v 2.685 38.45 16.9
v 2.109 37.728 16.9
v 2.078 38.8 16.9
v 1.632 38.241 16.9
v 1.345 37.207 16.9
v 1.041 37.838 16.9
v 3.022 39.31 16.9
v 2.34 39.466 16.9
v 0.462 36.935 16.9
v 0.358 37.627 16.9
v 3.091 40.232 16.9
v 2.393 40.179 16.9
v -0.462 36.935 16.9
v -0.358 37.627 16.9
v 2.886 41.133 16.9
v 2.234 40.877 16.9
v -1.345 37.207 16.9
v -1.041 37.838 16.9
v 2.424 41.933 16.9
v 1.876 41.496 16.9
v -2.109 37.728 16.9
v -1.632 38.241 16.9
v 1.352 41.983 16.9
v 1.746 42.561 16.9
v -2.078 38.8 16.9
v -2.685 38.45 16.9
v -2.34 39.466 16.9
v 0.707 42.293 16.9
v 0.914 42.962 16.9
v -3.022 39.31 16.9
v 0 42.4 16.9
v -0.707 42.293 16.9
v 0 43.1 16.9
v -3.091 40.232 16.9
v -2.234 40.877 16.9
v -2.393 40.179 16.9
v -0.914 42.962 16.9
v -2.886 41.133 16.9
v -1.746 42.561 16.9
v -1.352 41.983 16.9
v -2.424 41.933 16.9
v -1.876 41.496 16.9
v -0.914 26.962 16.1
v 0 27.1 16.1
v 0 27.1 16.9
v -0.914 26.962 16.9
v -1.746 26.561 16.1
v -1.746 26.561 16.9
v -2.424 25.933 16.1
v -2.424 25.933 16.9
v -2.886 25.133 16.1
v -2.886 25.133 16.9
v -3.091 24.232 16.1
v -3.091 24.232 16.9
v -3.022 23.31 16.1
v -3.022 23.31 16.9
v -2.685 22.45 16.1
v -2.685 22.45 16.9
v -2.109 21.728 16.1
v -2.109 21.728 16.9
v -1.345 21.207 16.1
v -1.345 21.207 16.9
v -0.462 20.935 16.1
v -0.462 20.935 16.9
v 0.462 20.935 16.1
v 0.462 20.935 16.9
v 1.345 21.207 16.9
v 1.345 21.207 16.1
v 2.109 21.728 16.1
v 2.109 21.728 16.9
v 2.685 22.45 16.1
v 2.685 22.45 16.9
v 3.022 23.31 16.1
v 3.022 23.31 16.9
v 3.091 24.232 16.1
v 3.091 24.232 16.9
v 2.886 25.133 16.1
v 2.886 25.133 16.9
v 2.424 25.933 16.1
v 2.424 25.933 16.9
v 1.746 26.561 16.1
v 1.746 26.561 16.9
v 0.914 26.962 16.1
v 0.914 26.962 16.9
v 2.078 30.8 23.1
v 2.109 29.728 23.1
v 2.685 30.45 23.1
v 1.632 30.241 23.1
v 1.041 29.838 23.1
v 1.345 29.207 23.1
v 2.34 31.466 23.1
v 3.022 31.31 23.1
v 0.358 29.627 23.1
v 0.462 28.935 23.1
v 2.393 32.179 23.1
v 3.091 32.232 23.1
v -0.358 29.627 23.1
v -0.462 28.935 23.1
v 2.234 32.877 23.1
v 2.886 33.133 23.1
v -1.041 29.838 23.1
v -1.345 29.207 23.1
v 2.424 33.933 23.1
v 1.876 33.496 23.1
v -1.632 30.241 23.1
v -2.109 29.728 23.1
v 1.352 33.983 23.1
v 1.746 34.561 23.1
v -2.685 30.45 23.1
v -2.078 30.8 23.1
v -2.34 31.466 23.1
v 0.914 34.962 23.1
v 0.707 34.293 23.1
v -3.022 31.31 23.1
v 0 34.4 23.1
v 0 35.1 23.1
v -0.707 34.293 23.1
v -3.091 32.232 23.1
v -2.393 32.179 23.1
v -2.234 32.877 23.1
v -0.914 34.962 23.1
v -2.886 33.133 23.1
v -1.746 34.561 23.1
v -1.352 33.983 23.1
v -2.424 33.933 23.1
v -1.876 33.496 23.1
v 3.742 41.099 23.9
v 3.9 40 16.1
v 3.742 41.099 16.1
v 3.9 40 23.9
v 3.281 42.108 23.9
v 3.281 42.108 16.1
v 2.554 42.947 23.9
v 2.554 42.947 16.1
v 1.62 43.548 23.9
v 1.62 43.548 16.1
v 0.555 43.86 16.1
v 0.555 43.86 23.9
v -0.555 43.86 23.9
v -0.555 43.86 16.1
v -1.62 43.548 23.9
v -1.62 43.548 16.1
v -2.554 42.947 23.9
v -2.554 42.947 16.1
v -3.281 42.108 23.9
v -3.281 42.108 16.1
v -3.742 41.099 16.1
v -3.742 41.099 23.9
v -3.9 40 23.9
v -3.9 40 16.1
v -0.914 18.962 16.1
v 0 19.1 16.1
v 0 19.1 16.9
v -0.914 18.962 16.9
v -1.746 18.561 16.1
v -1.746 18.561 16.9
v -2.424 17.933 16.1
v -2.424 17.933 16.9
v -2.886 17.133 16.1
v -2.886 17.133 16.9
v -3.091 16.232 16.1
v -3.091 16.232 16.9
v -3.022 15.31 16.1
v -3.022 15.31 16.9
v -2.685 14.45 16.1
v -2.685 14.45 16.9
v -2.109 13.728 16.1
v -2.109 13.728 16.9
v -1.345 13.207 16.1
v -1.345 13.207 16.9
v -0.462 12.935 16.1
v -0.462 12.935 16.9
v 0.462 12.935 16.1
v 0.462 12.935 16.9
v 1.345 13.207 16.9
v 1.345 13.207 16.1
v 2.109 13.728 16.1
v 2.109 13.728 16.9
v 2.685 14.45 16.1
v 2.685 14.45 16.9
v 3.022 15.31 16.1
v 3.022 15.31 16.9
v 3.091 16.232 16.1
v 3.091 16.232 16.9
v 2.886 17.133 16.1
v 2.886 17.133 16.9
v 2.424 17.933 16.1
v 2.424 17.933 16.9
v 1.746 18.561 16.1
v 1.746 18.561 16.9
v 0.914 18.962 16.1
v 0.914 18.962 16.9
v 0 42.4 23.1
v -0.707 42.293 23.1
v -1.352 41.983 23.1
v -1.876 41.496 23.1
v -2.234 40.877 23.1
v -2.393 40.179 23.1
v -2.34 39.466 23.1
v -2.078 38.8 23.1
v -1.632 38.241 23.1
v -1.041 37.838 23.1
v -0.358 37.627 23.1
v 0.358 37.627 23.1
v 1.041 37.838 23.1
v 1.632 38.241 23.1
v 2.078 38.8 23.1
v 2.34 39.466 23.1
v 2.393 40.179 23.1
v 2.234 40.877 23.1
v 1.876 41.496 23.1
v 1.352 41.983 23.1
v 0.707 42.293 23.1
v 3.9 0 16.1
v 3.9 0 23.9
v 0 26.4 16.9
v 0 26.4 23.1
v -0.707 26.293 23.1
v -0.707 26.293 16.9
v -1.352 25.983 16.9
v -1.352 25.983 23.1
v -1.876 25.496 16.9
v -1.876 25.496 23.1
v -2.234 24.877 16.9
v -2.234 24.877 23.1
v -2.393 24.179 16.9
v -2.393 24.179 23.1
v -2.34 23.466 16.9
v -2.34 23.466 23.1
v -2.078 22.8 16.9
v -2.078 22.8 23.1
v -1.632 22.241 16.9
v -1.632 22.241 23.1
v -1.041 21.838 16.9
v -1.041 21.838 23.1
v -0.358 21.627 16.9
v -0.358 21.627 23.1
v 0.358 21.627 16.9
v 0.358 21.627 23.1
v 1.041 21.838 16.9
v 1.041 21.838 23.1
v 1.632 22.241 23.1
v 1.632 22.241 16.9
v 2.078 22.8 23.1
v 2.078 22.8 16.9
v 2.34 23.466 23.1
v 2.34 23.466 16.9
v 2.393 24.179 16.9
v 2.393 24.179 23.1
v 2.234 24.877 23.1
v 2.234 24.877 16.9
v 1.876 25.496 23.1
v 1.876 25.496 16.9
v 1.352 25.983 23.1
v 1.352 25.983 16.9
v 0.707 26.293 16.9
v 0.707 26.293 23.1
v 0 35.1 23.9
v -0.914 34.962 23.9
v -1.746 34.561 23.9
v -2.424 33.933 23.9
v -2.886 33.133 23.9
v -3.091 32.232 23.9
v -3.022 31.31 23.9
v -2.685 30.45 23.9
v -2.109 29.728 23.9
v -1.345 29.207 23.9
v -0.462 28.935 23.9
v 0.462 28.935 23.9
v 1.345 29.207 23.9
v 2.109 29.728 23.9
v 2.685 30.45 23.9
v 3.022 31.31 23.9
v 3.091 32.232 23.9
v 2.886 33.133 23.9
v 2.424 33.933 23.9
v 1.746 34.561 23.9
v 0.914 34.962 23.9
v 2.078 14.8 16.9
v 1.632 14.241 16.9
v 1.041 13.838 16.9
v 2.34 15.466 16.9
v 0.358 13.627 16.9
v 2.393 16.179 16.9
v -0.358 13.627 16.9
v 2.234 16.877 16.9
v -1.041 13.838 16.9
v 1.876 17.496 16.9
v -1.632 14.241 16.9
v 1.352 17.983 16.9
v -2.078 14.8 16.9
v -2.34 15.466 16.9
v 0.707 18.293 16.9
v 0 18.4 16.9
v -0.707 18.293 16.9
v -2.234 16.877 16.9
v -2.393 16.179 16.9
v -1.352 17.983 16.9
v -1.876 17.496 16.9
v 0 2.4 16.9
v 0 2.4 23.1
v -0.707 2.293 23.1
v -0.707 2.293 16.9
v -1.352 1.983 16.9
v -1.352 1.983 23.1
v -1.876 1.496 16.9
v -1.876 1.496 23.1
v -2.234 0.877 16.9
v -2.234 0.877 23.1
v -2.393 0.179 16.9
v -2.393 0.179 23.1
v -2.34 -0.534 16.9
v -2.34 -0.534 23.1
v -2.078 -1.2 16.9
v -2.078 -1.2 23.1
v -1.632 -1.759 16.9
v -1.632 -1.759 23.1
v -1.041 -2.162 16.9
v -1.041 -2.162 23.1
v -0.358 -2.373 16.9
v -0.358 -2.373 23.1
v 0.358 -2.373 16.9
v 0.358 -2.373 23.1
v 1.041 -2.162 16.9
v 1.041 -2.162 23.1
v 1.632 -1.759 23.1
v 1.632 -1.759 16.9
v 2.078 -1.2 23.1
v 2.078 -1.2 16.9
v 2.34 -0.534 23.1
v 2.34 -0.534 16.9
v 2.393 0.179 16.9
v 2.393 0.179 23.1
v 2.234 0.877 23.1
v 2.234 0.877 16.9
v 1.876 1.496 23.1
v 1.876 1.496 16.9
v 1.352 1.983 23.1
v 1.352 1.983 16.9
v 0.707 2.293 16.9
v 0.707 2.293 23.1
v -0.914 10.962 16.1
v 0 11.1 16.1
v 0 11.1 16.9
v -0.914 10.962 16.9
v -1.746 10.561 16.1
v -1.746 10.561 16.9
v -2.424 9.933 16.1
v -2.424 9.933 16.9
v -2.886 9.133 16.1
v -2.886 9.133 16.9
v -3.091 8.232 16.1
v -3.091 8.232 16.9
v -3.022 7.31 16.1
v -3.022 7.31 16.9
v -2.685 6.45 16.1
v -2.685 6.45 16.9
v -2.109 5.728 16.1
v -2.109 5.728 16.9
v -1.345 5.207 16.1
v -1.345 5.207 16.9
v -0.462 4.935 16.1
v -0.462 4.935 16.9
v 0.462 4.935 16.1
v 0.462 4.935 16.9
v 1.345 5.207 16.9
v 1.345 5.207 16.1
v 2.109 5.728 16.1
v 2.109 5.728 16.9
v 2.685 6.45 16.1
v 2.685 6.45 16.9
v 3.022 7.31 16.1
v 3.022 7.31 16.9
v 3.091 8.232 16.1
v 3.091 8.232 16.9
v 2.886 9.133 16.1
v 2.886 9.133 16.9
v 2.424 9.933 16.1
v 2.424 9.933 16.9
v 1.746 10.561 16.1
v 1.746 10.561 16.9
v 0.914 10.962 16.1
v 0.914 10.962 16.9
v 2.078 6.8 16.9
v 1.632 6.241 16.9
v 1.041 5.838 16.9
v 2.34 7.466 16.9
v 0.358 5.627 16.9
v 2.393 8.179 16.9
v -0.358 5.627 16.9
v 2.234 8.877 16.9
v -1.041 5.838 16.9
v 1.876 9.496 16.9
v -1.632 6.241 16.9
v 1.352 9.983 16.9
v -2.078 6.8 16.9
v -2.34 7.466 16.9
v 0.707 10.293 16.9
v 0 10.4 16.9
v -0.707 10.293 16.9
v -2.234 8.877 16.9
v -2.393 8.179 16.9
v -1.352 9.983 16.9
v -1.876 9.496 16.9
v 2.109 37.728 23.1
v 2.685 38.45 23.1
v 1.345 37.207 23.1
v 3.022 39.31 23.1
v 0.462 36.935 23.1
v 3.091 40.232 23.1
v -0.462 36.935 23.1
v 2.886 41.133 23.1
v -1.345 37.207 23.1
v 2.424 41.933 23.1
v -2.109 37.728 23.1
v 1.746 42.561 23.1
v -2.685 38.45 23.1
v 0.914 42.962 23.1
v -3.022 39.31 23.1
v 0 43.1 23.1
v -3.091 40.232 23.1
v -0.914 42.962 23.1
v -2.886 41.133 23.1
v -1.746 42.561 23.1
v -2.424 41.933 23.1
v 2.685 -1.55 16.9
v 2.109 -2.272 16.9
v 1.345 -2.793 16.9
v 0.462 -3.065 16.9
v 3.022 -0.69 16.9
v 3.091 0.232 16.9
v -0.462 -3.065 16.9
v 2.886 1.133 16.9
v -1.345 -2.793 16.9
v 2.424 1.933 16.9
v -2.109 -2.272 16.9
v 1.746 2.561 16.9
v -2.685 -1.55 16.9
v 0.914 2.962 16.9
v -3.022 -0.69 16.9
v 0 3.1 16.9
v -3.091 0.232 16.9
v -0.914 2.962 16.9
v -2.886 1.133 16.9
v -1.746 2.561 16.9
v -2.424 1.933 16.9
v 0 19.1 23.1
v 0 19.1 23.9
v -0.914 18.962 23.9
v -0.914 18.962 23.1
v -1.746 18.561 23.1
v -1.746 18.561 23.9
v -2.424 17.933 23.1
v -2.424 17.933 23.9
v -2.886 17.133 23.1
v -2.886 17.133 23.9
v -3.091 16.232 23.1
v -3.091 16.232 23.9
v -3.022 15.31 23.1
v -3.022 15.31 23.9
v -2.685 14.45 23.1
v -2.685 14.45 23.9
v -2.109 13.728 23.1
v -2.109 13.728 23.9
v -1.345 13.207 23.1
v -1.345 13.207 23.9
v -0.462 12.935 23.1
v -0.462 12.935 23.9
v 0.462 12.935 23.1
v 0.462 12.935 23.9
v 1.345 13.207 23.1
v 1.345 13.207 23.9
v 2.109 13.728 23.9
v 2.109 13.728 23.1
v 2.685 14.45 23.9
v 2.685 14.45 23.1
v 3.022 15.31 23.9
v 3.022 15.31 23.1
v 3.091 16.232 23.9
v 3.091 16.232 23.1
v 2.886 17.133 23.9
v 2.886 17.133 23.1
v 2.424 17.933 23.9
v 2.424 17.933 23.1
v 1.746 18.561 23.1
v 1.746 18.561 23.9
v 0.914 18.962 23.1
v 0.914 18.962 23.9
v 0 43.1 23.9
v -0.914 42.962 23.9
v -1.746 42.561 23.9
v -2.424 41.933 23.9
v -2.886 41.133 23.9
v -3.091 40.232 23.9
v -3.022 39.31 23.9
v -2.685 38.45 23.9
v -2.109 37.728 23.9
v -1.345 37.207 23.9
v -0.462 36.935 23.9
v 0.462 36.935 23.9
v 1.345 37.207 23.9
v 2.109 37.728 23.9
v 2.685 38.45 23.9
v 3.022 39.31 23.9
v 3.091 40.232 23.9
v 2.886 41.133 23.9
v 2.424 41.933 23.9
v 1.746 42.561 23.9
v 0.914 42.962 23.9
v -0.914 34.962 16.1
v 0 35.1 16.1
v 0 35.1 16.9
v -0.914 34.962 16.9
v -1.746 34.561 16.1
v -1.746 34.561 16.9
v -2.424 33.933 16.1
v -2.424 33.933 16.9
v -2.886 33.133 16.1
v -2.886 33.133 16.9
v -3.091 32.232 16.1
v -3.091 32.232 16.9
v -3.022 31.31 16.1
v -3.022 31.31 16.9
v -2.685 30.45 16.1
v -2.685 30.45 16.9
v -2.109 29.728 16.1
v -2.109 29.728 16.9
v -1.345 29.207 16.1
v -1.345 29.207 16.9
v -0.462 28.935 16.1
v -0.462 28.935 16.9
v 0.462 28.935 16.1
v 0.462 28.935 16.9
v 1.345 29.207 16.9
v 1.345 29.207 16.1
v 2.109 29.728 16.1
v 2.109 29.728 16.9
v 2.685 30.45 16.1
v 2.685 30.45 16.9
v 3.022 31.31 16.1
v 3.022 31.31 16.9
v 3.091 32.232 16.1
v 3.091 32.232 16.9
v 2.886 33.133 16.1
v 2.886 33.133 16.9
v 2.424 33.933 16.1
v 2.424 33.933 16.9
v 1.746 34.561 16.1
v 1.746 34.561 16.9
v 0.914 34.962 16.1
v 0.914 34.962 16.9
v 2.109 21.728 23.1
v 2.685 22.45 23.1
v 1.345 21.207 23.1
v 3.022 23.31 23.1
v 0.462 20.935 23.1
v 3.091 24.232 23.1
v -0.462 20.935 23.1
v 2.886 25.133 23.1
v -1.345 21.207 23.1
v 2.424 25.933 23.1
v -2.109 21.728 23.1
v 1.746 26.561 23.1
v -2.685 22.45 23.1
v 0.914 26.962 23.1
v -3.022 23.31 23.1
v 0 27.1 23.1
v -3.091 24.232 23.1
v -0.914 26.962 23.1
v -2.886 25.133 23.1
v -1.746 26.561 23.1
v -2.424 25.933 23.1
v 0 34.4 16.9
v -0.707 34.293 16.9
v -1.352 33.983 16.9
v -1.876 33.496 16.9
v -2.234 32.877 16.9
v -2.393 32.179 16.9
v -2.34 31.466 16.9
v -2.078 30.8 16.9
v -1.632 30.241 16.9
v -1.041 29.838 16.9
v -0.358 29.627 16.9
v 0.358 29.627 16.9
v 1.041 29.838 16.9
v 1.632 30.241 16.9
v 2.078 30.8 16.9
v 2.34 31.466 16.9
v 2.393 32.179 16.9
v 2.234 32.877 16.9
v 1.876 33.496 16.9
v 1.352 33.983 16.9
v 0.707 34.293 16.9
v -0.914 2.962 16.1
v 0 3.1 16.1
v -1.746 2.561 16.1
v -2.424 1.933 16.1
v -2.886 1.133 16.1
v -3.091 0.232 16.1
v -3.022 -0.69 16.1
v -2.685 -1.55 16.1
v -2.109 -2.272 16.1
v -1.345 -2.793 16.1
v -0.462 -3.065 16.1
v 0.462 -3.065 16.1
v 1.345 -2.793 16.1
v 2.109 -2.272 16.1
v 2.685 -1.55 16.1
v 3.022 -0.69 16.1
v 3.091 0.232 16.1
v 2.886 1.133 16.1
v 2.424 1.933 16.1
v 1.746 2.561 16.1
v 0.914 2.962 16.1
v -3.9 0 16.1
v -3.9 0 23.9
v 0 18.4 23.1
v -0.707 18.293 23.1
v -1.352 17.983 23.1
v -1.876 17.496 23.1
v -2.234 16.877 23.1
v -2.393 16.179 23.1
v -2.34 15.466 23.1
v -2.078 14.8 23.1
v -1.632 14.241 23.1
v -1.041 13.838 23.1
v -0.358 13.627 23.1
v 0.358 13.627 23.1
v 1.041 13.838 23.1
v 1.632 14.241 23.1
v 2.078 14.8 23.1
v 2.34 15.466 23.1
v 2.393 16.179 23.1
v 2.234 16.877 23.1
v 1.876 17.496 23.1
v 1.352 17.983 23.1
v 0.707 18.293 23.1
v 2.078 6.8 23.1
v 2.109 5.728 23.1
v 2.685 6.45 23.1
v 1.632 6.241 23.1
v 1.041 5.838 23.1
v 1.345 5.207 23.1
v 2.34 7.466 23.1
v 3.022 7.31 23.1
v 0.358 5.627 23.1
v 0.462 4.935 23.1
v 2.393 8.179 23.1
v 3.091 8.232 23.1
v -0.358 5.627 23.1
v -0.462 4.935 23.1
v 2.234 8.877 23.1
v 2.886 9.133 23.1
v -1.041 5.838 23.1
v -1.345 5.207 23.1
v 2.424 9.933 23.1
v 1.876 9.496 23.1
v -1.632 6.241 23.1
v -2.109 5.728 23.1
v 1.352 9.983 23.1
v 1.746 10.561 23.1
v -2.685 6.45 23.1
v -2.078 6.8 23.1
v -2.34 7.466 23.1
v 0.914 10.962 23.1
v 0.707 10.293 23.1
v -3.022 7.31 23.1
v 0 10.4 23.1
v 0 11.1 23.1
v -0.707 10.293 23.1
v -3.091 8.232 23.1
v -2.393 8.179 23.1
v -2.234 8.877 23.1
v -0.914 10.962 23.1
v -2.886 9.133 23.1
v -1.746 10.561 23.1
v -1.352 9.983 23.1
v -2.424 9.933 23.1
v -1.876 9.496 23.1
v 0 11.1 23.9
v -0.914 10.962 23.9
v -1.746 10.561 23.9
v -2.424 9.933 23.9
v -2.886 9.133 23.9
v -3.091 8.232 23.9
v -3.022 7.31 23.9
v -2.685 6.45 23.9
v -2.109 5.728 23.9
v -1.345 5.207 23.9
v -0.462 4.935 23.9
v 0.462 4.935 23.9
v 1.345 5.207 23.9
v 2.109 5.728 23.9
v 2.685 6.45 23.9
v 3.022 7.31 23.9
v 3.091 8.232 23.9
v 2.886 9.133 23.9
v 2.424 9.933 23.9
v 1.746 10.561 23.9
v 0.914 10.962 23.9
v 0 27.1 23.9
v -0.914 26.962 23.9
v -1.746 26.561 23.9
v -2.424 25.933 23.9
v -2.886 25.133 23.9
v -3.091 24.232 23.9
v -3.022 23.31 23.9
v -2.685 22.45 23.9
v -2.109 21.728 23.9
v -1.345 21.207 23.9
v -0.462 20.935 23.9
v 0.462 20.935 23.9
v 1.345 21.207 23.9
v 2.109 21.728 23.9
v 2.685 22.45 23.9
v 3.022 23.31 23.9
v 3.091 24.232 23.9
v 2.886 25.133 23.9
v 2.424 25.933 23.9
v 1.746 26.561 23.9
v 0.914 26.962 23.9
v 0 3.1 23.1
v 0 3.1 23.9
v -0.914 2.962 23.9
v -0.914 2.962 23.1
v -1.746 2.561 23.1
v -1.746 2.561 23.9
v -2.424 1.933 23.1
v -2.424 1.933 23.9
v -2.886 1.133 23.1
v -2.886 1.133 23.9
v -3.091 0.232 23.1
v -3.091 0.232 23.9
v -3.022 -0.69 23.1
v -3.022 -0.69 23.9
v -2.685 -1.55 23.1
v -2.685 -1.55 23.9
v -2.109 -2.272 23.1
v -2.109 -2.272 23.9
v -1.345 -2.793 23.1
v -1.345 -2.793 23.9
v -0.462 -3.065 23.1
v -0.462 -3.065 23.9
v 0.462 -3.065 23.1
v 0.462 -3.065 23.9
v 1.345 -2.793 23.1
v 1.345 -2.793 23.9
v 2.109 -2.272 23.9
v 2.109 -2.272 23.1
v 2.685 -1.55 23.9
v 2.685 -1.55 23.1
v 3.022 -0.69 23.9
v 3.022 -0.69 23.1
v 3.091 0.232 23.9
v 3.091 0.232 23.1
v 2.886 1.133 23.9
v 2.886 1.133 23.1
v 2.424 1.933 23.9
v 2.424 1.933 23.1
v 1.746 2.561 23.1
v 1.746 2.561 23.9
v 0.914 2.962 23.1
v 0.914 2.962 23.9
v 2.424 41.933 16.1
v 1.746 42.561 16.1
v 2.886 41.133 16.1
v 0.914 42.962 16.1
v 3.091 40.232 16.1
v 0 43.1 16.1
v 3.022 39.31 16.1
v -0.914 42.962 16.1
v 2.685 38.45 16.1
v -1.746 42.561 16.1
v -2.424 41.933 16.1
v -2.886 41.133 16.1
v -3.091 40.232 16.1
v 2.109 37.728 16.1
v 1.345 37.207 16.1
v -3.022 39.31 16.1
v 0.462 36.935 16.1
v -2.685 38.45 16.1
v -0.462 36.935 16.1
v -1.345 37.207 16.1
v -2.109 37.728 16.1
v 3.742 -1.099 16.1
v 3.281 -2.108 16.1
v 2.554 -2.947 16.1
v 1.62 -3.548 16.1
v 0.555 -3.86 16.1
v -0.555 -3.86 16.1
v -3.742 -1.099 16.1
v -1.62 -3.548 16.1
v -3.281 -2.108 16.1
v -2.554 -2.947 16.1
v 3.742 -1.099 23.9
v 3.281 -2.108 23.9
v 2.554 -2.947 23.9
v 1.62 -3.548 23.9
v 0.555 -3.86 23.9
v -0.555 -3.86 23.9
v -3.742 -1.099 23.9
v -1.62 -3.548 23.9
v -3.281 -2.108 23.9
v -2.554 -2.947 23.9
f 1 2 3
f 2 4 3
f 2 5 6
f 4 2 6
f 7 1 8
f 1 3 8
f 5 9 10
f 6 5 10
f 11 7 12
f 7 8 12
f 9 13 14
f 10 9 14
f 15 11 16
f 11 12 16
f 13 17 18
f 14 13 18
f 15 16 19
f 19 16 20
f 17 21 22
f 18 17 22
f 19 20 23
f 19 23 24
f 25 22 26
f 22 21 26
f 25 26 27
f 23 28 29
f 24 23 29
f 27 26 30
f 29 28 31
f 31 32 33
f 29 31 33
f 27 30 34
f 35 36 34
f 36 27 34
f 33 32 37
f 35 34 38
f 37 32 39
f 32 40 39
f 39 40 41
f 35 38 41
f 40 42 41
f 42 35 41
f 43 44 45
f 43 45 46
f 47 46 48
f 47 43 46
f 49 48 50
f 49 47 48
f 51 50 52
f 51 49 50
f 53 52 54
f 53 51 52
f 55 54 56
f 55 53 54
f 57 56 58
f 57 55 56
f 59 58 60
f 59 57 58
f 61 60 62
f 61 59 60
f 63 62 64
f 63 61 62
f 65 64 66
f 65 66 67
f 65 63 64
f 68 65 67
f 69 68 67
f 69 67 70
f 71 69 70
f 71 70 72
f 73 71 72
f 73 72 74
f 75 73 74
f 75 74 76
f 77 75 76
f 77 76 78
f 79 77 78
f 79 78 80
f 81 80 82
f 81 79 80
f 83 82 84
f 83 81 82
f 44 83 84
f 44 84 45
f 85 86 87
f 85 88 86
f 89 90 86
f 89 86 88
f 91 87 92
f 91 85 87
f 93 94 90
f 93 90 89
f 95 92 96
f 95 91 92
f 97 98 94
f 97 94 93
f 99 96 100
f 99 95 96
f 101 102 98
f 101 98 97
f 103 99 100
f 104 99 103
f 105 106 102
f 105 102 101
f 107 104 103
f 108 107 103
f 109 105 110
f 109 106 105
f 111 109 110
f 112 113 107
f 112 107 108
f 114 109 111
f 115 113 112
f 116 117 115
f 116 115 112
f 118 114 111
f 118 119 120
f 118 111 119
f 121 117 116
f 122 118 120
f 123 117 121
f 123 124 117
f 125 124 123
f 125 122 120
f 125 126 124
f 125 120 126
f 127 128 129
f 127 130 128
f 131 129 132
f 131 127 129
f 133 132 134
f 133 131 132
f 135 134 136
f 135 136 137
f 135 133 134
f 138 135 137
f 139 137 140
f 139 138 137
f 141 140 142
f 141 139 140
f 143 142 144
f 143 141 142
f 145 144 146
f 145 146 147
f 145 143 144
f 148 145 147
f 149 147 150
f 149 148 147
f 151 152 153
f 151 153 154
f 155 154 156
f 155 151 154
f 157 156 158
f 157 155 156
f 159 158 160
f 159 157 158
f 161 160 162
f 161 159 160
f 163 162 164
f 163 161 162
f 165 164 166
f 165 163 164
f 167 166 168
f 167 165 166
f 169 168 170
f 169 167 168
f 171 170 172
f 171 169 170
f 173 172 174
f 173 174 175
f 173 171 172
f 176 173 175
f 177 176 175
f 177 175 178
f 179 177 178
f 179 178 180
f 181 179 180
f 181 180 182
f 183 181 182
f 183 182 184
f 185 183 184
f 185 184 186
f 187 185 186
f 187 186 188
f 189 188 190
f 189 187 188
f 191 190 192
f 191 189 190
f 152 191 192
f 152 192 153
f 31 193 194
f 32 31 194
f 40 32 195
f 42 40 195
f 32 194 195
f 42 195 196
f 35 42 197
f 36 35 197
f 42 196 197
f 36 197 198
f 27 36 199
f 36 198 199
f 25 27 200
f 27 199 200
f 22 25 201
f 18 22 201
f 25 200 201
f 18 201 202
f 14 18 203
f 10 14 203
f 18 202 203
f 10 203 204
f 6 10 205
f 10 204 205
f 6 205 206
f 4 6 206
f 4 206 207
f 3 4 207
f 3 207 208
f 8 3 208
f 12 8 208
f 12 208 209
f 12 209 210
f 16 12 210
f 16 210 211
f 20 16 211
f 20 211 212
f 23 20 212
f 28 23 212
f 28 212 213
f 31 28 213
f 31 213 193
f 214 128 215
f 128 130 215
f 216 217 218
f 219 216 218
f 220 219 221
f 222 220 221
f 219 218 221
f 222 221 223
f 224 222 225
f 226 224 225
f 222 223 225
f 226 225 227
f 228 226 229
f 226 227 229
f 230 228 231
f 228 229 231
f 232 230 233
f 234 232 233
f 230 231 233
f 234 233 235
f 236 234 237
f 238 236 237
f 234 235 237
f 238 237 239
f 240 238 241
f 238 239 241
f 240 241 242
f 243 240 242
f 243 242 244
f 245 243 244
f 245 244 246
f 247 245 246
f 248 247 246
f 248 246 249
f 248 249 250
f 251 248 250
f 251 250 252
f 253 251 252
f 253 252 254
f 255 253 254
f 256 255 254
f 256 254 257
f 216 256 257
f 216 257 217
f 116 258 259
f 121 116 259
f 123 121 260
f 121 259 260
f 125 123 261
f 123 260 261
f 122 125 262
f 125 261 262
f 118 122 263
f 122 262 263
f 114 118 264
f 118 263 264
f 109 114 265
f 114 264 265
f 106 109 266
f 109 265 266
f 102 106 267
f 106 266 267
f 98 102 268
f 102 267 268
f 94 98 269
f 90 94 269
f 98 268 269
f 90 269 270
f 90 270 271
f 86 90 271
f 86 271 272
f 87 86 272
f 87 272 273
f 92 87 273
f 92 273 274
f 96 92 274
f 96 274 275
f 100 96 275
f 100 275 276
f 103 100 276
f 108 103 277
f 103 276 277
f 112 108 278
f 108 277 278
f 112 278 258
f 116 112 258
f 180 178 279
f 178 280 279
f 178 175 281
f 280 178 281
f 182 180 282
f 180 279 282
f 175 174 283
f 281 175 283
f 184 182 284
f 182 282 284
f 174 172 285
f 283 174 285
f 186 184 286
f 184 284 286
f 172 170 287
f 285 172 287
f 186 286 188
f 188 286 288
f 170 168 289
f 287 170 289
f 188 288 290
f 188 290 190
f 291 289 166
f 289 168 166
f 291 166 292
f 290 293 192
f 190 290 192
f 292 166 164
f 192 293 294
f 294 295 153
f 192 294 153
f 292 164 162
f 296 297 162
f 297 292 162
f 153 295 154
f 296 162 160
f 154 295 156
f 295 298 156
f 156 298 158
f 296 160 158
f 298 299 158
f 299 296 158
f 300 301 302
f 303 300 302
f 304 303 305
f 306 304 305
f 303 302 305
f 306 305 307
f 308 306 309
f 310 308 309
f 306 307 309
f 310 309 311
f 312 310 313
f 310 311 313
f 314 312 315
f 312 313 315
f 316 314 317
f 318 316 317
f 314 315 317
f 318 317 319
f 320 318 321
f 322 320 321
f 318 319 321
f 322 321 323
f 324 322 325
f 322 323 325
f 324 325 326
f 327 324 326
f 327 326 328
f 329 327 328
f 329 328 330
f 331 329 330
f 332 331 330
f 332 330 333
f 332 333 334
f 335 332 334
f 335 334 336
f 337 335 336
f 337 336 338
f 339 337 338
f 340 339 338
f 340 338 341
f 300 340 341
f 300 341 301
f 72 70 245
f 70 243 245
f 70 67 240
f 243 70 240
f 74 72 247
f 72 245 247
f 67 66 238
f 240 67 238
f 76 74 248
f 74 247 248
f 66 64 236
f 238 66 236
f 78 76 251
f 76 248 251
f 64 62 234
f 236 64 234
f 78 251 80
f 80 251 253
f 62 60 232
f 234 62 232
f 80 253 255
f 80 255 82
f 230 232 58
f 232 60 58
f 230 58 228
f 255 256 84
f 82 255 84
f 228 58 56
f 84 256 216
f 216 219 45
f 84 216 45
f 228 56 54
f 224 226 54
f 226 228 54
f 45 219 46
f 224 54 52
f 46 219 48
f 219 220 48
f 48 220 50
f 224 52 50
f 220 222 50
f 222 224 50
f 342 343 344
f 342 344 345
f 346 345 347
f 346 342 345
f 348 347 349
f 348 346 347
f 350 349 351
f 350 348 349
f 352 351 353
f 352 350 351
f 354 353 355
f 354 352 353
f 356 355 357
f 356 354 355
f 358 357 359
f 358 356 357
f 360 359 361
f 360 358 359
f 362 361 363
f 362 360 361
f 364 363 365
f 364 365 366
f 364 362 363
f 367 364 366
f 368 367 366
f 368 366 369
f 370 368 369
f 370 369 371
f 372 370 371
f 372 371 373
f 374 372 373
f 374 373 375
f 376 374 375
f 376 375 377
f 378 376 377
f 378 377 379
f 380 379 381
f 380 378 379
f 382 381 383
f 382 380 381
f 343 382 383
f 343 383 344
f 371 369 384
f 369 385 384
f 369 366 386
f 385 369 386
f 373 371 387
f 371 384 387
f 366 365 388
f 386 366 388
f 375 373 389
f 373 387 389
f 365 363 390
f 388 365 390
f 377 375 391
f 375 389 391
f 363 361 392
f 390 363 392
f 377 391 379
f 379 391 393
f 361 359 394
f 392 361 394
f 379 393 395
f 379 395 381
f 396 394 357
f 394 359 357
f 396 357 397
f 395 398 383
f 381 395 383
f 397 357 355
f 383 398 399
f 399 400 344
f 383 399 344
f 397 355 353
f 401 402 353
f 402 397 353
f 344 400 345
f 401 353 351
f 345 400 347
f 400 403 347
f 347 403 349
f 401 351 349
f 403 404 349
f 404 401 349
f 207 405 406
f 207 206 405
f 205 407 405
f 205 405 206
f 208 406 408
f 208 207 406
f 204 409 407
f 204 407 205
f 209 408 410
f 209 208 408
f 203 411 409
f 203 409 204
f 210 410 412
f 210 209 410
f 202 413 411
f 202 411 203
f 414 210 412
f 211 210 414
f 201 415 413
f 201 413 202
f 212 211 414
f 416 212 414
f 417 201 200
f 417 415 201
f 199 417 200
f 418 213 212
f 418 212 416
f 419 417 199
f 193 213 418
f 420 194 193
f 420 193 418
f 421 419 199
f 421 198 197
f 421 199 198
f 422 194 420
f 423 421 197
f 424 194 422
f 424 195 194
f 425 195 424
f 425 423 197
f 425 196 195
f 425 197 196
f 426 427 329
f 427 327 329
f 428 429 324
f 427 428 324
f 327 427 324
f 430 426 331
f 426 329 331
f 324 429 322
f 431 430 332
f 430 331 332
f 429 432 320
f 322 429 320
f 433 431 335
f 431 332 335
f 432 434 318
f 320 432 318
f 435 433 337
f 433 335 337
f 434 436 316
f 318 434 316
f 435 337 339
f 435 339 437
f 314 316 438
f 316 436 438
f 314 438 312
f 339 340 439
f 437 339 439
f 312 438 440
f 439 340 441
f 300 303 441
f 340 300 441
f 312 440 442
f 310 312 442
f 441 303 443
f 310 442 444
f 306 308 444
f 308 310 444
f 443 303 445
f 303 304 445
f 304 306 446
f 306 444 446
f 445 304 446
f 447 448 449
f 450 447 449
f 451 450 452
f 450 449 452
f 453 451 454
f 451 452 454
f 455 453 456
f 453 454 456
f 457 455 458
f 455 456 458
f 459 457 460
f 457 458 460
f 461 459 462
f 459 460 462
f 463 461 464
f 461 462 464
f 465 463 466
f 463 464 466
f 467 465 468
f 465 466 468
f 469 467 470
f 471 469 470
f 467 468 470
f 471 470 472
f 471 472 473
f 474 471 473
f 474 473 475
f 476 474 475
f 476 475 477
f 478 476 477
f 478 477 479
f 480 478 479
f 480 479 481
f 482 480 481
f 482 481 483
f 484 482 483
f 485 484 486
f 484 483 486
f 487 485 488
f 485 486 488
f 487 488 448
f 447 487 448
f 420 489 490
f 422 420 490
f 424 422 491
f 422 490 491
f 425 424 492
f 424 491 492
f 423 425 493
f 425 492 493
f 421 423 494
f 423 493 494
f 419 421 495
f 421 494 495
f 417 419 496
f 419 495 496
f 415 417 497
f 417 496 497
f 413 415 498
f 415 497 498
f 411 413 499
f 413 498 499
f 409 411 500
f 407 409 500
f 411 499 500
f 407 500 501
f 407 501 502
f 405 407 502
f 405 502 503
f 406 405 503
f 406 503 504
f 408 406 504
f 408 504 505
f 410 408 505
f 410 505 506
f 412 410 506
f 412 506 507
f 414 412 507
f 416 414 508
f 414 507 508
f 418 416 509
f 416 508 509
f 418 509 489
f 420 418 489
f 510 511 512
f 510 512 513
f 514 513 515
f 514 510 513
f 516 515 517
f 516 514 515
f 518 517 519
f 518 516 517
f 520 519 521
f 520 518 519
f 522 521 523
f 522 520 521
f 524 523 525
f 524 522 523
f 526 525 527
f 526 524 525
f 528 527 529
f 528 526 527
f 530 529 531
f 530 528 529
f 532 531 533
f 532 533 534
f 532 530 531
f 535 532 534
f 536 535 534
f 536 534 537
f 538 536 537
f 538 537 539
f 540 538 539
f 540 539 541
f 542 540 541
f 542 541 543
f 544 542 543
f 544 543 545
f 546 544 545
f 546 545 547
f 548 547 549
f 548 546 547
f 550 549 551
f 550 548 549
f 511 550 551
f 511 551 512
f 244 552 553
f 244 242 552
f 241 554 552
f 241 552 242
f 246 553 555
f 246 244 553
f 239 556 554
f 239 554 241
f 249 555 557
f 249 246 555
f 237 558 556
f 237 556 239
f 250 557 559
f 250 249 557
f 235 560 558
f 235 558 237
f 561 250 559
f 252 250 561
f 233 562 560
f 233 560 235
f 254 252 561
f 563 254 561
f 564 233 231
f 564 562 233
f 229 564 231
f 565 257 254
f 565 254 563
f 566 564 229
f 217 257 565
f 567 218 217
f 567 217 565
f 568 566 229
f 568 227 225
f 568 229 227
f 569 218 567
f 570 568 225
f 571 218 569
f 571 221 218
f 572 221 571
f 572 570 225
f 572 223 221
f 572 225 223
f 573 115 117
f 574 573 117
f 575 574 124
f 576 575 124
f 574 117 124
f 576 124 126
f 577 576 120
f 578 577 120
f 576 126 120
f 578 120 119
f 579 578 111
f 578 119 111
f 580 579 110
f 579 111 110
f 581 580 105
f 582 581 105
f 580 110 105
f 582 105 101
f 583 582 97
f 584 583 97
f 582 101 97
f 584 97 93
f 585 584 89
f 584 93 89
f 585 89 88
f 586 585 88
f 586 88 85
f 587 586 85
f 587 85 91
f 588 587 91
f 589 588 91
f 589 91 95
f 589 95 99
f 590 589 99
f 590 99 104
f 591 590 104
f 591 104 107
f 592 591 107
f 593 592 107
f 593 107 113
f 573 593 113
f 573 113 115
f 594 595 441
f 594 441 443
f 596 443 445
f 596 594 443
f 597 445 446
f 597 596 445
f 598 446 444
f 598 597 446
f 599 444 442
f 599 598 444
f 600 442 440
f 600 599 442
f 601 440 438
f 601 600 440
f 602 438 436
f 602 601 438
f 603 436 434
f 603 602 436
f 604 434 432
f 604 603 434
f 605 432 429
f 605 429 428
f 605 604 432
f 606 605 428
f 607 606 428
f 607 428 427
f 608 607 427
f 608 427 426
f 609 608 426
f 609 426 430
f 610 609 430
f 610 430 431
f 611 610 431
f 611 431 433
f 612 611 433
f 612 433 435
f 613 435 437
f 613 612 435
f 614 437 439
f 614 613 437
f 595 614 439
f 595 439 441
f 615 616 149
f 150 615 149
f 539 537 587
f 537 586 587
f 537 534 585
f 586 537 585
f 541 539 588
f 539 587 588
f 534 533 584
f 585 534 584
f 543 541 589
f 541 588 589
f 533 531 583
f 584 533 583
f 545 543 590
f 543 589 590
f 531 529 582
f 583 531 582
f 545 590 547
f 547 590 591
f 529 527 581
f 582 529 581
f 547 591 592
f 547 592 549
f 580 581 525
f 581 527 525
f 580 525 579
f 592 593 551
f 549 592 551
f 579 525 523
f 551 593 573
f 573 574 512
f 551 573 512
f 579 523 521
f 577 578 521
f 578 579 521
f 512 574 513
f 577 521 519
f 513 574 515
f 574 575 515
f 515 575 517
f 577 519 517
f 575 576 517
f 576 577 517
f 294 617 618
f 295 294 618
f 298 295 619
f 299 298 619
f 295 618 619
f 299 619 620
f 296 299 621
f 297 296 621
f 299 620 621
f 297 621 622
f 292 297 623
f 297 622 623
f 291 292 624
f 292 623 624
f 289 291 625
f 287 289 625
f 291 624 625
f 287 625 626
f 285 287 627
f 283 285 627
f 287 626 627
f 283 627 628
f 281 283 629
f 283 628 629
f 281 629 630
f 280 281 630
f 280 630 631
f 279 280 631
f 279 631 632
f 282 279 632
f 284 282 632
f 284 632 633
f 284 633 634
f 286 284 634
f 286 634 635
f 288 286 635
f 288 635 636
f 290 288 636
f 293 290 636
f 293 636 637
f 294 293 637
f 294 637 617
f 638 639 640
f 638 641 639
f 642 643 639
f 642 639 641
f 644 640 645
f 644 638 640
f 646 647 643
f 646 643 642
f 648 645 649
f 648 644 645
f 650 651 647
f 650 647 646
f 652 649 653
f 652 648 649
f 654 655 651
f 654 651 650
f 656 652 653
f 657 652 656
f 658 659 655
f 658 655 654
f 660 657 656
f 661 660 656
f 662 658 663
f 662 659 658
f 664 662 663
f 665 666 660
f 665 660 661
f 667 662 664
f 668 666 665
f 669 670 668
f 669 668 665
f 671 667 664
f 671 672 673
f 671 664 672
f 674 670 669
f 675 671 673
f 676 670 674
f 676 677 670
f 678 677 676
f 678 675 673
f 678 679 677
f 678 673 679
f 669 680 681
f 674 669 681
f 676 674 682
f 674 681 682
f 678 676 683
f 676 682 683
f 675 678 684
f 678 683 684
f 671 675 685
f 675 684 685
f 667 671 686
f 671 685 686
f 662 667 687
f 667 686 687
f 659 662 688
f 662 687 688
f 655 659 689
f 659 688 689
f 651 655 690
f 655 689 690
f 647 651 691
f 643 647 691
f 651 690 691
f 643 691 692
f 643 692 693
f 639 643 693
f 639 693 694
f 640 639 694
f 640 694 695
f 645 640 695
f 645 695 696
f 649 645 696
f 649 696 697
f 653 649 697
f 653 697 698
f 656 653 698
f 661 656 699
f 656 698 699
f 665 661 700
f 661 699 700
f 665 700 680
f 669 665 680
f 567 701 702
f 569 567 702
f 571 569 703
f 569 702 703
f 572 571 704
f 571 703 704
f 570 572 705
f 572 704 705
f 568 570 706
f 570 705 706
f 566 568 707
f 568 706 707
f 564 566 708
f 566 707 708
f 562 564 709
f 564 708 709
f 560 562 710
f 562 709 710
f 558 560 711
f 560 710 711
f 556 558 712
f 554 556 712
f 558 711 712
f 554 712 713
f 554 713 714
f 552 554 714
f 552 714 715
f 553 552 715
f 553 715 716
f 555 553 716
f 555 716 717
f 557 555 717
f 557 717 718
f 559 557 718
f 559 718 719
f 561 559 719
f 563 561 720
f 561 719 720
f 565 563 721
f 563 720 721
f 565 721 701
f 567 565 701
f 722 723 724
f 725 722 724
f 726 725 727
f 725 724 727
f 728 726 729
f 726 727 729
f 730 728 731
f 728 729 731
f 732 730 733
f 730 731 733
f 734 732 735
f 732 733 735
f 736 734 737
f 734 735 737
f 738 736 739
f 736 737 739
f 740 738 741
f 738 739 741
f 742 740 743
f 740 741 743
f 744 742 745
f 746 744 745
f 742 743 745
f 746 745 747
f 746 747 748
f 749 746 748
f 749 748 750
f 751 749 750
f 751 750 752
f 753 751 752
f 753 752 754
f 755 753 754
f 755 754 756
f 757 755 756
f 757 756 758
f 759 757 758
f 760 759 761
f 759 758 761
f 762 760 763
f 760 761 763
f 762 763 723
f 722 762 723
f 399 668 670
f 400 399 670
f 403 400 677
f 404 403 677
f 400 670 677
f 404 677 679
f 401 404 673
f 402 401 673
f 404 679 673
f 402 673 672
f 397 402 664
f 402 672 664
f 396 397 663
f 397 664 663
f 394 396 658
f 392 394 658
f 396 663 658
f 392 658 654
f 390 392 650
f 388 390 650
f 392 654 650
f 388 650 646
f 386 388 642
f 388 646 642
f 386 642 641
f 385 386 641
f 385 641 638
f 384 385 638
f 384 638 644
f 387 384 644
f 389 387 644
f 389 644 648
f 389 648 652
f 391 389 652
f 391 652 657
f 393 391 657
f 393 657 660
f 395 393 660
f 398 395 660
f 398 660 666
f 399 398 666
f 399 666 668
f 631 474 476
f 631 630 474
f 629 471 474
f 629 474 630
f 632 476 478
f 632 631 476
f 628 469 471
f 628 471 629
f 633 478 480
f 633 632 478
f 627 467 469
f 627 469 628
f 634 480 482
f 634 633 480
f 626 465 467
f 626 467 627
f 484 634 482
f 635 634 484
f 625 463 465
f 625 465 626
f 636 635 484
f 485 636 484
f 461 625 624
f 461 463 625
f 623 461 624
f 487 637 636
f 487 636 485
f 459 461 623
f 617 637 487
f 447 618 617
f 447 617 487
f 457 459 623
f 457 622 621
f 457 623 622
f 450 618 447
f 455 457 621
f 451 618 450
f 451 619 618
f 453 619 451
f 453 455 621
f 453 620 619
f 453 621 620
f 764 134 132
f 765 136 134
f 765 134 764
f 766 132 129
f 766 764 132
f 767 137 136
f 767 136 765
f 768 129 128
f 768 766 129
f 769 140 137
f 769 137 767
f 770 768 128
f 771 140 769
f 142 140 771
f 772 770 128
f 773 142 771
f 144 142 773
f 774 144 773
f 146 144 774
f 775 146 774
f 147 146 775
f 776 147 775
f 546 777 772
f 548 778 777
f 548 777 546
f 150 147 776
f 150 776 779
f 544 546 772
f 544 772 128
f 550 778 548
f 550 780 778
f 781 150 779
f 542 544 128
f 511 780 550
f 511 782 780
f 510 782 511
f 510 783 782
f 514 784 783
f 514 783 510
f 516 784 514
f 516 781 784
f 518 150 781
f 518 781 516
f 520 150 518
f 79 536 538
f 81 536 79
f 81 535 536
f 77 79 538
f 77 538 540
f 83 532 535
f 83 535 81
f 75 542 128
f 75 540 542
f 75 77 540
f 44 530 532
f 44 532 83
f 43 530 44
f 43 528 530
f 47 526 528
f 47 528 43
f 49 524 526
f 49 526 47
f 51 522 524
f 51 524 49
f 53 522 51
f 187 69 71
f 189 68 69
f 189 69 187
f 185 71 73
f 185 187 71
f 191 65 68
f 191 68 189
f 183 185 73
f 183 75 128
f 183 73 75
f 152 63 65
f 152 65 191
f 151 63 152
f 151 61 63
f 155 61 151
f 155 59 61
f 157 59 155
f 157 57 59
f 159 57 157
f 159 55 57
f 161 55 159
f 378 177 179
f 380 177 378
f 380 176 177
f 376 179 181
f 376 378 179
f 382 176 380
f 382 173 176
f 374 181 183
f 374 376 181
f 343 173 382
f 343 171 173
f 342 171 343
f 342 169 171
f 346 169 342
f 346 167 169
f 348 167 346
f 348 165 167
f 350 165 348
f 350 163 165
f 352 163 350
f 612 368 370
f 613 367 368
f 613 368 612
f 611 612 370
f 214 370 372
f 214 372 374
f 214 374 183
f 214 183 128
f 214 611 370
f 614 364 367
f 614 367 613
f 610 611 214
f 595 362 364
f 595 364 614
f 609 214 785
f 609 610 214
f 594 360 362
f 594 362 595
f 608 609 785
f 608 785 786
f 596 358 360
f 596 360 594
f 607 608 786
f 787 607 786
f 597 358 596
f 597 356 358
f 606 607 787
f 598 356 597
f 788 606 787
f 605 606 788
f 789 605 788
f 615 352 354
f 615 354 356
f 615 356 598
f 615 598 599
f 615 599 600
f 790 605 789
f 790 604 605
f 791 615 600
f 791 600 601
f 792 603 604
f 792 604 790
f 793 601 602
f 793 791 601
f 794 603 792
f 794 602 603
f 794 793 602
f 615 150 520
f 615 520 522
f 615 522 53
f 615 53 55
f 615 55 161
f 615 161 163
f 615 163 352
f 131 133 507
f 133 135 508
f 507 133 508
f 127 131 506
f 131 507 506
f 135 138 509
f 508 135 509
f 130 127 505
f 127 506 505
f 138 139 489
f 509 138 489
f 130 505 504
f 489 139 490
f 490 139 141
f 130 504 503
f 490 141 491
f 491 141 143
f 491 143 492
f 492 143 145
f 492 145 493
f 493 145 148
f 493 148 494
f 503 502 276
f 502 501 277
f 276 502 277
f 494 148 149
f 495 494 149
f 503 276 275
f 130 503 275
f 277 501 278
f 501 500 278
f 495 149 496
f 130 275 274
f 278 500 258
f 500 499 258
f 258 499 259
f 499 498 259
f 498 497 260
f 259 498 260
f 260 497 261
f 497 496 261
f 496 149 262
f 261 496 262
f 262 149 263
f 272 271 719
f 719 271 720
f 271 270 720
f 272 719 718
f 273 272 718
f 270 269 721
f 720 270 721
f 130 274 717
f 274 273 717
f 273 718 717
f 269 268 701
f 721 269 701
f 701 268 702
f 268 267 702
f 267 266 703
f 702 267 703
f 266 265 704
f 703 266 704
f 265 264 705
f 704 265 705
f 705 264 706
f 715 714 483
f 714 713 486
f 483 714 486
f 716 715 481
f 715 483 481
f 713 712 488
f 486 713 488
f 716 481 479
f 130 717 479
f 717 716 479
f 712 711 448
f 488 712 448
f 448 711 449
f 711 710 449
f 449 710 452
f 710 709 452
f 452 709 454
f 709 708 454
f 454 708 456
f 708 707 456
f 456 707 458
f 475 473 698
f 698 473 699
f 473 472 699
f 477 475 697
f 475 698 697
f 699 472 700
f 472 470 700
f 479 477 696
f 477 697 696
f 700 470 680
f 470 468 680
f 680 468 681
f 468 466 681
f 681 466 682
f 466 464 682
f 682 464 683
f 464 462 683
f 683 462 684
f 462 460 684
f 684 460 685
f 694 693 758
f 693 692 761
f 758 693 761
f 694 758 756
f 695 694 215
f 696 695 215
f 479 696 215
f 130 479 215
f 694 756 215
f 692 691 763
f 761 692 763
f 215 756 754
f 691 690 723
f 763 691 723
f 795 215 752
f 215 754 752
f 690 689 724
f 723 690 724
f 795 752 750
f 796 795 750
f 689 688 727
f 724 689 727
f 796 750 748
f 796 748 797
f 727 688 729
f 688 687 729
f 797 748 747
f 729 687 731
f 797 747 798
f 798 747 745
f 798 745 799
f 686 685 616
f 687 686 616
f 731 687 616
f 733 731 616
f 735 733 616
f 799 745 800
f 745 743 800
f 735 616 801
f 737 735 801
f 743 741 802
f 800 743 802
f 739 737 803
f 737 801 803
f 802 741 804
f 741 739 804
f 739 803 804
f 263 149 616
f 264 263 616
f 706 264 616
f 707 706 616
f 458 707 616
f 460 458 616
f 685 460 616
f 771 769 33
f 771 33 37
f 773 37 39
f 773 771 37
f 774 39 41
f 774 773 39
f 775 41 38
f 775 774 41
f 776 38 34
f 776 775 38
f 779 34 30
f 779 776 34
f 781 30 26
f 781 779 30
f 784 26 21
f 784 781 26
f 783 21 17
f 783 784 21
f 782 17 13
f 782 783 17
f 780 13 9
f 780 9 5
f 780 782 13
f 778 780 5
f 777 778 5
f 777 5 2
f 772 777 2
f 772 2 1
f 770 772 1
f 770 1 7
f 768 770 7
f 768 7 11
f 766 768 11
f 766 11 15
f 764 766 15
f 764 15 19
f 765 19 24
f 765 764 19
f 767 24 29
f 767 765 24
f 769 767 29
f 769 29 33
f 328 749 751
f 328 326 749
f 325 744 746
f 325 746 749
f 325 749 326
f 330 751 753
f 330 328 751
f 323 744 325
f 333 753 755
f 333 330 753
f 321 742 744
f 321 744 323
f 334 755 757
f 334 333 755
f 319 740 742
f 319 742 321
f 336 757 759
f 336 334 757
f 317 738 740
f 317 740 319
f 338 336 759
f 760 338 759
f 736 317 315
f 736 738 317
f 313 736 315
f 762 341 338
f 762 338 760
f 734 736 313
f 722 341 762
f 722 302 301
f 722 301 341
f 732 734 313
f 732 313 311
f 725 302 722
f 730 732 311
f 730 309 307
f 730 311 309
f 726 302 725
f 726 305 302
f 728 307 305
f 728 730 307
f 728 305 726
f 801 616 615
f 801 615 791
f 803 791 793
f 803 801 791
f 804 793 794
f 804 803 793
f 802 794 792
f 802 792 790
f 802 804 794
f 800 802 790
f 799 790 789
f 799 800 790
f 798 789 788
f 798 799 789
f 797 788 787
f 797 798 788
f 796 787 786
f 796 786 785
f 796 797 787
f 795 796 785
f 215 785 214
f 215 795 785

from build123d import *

# Parameters (mm, degrees)
PAD014_DEPTH                       = 3.9
SKETCH022_R                        = 2.4
POCKET007_DEPTH                    = 7.8
LINEARPATTERN007_COUNT             = 6
LINEARPATTERN007_PITCH             = 8
SKETCH023_R                        = 3.1
POCKET008_DEPTH                    = 0.8
SKETCH023_LINEARPATTERN008_2_R     = 3.1
POCKET008_LINEARPATTERN008_2_DEPTH = 0.8
SKETCH023_LINEARPATTERN008_3_R     = 3.1
POCKET008_LINEARPATTERN008_3_DEPTH = 0.8
SKETCH023_LINEARPATTERN008_4_R     = 3.1
POCKET008_LINEARPATTERN008_4_DEPTH = 0.8
SKETCH023_LINEARPATTERN008_5_R     = 3.1
POCKET008_LINEARPATTERN008_5_DEPTH = 0.8
SKETCH023_LINEARPATTERN008_6_R     = 3.1
POCKET008_LINEARPATTERN008_6_DEPTH = 0.8
BODY005_PLACEMENT_ANGLE            = 90


with BuildPart() as part:
    # Sketch021 → Pad014 (new body, symmetric)
    with BuildSketch(Plane.XY):
        with BuildLine():
            Line((-20, 3.9), (20, 3.9))
            ThreePointArc((20, -3.9), (23.9, 0), (20, 3.9))
            Line((20, -3.9), (-20, -3.9))
            ThreePointArc((-20, 3.9), (-23.9, 0), (-20, -3.9))
        make_face()
    extrude(amount=PAD014_DEPTH, both=True)

    # Sketch022 (on Face6 of Pad014) → Pocket007 (cut)
    with BuildSketch(Plane.XY.offset(3.9)):
        with Locations((20, 0)):
            Circle(SKETCH022_R)
    pocket007 = extrude(amount=-POCKET007_DEPTH, mode=Mode.SUBTRACT)

    # LinearPattern007: Pocket007 ×6
    with Locations(*[(-i * LINEARPATTERN007_PITCH, 0, 0) for i in range(1, LINEARPATTERN007_COUNT)]):
        add(pocket007, mode=Mode.SUBTRACT)

    # Sketch023 (on Face5 of LinearPattern007) → Pocket008 (cut)
    with BuildSketch(Plane.XY.offset(3.9)):
        with Locations((20, 0)):
            Circle(SKETCH023_R)
    pocket008 = extrude(amount=-POCKET008_DEPTH, mode=Mode.SUBTRACT)

    # Sketch023 LinearPattern008 2 → Pocket008 LinearPattern008 2 (cut)
    with BuildSketch(Plane(origin=(-8, 0, 3.9), x_dir=(1, 0, 0), z_dir=(0, 0, 1))):
        with Locations((20, 0)):
            Circle(SKETCH023_LINEARPATTERN008_2_R)
    pocket008_linearpattern008_2 = extrude(amount=-POCKET008_LINEARPATTERN008_2_DEPTH, mode=Mode.SUBTRACT)

    # Sketch023 LinearPattern008 3 → Pocket008 LinearPattern008 3 (cut)
    with BuildSketch(Plane(origin=(-16, 0, 3.9), x_dir=(1, 0, 0), z_dir=(0, 0, 1))):
        with Locations((20, 0)):
            Circle(SKETCH023_LINEARPATTERN008_3_R)
    pocket008_linearpattern008_3 = extrude(amount=-POCKET008_LINEARPATTERN008_3_DEPTH, mode=Mode.SUBTRACT)

    # Sketch023 LinearPattern008 4 → Pocket008 LinearPattern008 4 (cut)
    with BuildSketch(Plane(origin=(-24, 0, 3.9), x_dir=(1, 0, 0), z_dir=(0, 0, 1))):
        with Locations((20, 0)):
            Circle(SKETCH023_LINEARPATTERN008_4_R)
    pocket008_linearpattern008_4 = extrude(amount=-POCKET008_LINEARPATTERN008_4_DEPTH, mode=Mode.SUBTRACT)

    # Sketch023 LinearPattern008 5 → Pocket008 LinearPattern008 5 (cut)
    with BuildSketch(Plane(origin=(-32, 0, 3.9), x_dir=(1, 0, 0), z_dir=(0, 0, 1))):
        with Locations((20, 0)):
            Circle(SKETCH023_LINEARPATTERN008_5_R)
    pocket008_linearpattern008_5 = extrude(amount=-POCKET008_LINEARPATTERN008_5_DEPTH, mode=Mode.SUBTRACT)

    # Sketch023 LinearPattern008 6 → Pocket008 LinearPattern008 6 (cut)
    with BuildSketch(Plane(origin=(-40, 0, 3.9), x_dir=(1, 0, 0), z_dir=(0, 0, 1))):
        with Locations((20, 0)):
            Circle(SKETCH023_LINEARPATTERN008_6_R)
    pocket008_linearpattern008_6 = extrude(amount=-POCKET008_LINEARPATTERN008_6_DEPTH, mode=Mode.SUBTRACT)

    # Mirrored003: Pocket008, Pocket008 LinearPattern008 2, Pocket008 LinearPattern008 3, Pocket008 LinearPattern008 4, Pocket008 LinearPattern008 5, Pocket008 LinearPattern008 6 across XY
    add(pocket008.mirror(Plane.XY), mode=Mode.SUBTRACT)
    add(pocket008_linearpattern008_2.mirror(Plane.XY), mode=Mode.SUBTRACT)
    add(pocket008_linearpattern008_3.mirror(Plane.XY), mode=Mode.SUBTRACT)
    add(pocket008_linearpattern008_4.mirror(Plane.XY), mode=Mode.SUBTRACT)
    add(pocket008_linearpattern008_5.mirror(Plane.XY), mode=Mode.SUBTRACT)
    add(pocket008_linearpattern008_6.mirror(Plane.XY), mode=Mode.SUBTRACT)


with BuildPart() as part_1:
    # Body005 placement: moved
    add(part.part.moved(Location((0, 20, 20))).rotate(Axis((0, 20, 20), (0, 0, 1)), BODY005_PLACEMENT_ANGLE))


solid = part_1.part
